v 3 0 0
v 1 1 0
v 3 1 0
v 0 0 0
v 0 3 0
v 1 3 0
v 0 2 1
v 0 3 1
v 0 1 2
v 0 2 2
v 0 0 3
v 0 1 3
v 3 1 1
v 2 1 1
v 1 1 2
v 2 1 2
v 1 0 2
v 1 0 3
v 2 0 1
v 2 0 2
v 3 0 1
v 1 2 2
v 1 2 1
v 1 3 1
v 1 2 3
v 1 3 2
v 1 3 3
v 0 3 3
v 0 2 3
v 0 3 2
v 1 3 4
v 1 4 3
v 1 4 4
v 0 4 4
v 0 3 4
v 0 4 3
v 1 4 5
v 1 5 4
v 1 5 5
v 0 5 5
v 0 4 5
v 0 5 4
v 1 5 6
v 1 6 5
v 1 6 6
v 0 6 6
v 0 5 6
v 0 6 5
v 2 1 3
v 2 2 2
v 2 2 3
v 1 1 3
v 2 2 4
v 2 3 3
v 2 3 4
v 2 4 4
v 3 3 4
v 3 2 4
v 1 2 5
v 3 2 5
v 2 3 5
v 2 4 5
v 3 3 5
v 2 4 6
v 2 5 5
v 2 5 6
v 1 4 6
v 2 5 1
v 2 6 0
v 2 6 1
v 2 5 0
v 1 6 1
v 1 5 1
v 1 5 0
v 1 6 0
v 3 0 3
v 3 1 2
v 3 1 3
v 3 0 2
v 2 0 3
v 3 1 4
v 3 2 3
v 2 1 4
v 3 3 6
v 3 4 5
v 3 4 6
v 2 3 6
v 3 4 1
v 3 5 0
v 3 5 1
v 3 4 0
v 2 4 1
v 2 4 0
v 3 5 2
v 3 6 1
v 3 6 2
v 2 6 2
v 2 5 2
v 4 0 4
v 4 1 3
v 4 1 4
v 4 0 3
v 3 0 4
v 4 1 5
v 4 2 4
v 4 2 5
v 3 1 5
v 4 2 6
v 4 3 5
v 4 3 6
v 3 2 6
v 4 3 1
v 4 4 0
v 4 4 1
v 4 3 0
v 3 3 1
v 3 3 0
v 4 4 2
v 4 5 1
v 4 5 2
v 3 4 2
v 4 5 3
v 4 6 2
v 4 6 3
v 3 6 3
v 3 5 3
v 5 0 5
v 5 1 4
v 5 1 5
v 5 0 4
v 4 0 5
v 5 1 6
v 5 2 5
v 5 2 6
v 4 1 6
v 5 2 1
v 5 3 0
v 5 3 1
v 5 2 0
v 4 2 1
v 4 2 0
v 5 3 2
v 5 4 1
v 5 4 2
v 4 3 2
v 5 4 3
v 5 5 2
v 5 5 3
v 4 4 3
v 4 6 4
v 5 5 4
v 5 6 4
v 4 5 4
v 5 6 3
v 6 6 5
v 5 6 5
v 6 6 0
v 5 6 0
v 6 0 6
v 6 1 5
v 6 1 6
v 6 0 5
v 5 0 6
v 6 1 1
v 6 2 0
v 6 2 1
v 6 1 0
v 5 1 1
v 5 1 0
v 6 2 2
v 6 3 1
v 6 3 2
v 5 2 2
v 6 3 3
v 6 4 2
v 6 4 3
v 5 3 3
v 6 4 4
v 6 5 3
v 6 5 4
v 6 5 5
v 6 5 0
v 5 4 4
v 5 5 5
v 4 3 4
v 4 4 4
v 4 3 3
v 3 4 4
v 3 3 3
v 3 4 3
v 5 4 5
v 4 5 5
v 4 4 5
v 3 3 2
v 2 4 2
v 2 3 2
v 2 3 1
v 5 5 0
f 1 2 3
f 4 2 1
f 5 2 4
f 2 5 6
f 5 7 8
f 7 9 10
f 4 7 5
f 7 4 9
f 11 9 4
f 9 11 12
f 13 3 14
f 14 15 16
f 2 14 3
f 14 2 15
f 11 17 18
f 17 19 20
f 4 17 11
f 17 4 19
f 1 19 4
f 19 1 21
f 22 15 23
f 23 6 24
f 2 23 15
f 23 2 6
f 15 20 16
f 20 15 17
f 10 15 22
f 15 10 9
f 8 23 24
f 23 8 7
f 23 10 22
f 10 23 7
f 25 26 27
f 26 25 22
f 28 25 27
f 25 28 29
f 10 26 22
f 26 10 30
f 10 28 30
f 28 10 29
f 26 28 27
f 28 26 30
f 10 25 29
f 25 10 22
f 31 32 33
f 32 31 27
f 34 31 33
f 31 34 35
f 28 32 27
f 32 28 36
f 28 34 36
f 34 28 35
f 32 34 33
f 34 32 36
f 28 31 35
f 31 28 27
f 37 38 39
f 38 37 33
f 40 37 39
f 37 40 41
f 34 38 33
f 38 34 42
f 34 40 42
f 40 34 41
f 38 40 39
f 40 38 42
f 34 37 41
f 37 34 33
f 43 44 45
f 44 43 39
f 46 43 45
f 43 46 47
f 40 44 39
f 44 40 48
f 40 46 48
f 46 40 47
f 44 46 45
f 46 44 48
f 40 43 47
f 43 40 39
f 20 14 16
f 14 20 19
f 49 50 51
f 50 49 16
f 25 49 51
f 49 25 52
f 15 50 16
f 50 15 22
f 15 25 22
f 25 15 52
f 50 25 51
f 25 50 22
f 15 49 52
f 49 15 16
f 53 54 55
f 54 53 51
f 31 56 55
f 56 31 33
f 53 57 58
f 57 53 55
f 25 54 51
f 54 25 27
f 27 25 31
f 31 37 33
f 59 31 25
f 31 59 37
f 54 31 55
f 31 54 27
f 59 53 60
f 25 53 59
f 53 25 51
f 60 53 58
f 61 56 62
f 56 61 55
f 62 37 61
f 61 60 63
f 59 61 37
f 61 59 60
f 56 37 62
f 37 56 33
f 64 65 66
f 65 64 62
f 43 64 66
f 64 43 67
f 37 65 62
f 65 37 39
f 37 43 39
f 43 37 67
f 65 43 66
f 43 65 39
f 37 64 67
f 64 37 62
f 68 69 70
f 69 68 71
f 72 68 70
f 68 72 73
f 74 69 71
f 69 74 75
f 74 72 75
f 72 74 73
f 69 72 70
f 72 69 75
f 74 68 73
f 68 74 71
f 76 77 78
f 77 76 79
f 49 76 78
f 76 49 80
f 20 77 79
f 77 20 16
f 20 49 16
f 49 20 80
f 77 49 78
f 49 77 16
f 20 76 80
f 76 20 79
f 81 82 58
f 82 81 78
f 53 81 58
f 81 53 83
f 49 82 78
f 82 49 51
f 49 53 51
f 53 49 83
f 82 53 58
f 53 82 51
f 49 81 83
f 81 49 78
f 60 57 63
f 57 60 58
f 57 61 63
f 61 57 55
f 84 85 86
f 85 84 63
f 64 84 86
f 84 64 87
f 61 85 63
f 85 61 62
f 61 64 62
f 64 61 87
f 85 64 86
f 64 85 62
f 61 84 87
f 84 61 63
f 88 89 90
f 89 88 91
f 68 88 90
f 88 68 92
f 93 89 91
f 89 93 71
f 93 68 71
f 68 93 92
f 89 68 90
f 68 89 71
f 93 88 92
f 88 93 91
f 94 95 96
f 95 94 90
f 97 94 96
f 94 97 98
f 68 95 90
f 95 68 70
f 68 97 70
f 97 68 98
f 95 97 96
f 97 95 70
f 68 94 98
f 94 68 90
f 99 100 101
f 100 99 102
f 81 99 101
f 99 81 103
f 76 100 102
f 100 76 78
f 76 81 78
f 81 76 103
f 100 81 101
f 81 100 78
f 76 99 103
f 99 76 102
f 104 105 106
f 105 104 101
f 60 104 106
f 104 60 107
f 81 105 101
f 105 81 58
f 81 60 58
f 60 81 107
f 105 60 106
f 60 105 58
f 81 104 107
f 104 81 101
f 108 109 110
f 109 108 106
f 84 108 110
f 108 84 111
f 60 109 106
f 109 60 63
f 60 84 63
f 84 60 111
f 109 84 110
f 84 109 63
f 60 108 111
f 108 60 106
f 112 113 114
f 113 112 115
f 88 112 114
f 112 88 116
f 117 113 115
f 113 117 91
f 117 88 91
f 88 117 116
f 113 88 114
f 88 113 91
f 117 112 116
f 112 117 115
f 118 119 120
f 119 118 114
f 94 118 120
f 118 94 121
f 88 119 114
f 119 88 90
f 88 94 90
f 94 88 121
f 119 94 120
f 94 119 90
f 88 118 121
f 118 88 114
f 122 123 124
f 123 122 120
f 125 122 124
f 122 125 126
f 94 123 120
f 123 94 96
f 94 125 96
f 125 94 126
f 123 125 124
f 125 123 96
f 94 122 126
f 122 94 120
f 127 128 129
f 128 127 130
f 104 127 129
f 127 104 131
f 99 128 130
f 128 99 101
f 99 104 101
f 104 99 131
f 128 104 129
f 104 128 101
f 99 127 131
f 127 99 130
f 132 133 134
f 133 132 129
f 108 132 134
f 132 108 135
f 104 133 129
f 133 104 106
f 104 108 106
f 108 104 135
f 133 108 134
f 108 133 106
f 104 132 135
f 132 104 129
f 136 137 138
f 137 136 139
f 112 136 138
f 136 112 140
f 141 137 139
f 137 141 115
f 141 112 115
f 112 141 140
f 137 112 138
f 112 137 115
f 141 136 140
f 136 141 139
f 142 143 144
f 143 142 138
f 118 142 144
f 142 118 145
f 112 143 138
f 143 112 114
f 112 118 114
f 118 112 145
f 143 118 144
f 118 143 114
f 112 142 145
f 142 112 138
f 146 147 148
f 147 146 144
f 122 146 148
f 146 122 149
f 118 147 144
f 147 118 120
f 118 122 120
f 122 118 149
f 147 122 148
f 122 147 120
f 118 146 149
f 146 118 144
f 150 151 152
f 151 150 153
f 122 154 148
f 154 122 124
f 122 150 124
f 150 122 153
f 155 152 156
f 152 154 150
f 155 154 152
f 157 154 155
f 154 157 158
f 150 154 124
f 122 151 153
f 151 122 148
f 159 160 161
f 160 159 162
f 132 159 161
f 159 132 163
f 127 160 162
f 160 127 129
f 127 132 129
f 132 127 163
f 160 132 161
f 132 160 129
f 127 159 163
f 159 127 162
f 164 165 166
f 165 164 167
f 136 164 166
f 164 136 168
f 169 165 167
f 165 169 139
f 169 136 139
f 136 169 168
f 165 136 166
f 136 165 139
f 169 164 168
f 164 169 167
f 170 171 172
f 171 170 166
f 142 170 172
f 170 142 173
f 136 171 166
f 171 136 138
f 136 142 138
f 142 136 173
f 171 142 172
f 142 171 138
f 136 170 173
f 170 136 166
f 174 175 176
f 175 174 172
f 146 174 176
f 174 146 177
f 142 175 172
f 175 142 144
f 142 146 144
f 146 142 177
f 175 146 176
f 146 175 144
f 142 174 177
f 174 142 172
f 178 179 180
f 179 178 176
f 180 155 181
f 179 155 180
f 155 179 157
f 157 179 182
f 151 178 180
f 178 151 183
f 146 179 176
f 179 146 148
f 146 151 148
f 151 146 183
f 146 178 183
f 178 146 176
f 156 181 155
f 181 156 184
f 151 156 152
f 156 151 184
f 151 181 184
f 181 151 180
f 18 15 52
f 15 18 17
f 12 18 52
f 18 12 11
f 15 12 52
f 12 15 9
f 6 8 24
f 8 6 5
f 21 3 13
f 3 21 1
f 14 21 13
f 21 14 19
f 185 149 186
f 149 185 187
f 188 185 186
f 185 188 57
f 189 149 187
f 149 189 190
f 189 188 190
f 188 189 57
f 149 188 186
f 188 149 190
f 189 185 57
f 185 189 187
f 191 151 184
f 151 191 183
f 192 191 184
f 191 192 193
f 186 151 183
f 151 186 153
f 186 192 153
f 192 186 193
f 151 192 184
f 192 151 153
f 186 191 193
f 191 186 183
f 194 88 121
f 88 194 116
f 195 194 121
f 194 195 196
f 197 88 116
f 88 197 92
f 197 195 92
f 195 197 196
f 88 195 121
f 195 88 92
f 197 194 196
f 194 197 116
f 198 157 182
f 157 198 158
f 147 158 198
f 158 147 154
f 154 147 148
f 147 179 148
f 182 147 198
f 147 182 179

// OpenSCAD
union() {
    translate([0, 0, 0]) cube([1, 1, 1]);
    translate([0, 1, 1]) cube([1, 1, 1]);
    translate([0, 2, 2]) cube([1, 1, 1]);
    translate([0, 3, 3]) cube([1, 1, 1]);
    translate([0, 4, 4]) cube([1, 1, 1]);
    translate([0, 5, 5]) cube([1, 1, 1]);
    translate([1, 0, 1]) cube([1, 1, 1]);
    translate([1, 1, 2]) cube([1, 1, 1]);
    translate([1, 2, 3]) cube([1, 1, 1]);
    translate([1, 3, 4]) cube([1, 1, 1]);
    translate([1, 4, 5]) cube([1, 1, 1]);
    translate([1, 5, 0]) cube([1, 1, 1]);
    translate([2, 0, 2]) cube([1, 1, 1]);
    translate([2, 1, 3]) cube([1, 1, 1]);
    translate([2, 2, 4]) cube([1, 1, 1]);
    translate([2, 3, 5]) cube([1, 1, 1]);
    translate([2, 4, 0]) cube([1, 1, 1]);
    translate([2, 5, 1]) cube([1, 1, 1]);
    translate([3, 0, 3]) cube([1, 1, 1]);
    translate([3, 1, 4]) cube([1, 1, 1]);
    translate([3, 2, 5]) cube([1, 1, 1]);
    translate([3, 3, 0]) cube([1, 1, 1]);
    translate([3, 4, 1]) cube([1, 1, 1]);
    translate([3, 5, 2]) cube([1, 1, 1]);
    translate([4, 0, 4]) cube([1, 1, 1]);
    translate([4, 1, 5]) cube([1, 1, 1]);
    translate([4, 2, 0]) cube([1, 1, 1]);
    translate([4, 3, 1]) cube([1, 1, 1]);
    translate([4, 4, 2]) cube([1, 1, 1]);
    translate([4, 5, 3]) cube([1, 1, 1]);
    translate([5, 0, 5]) cube([1, 1, 1]);
    translate([5, 1, 0]) cube([1, 1, 1]);
    translate([5, 2, 1]) cube([1, 1, 1]);
    translate([5, 3, 2]) cube([1, 1, 1]);
    translate([5, 4, 3]) cube([1, 1, 1]);
    translate([5, 5, 4]) cube([1, 1, 1]);
    translate([0, 0, 1]) cube([1, 1, 1]);
    translate([0, 0, 2]) cube([1, 1, 1]);
    translate([0, 1, 0]) cube([1, 1, 1]);
    translate([0, 2, 0]) cube([1, 1, 1]);
    translate([1, 0, 0]) cube([1, 1, 1]);
    translate([2, 0, 0]) cube([1, 1, 1]);
    translate([3, 3, 3]) cube([1, 1, 1]);
    translate([4, 4, 4]) cube([1, 1, 1]);
    translate([1, 2, 4]) cube([1, 1, 1]);
    translate([2, 3, 1]) cube([1, 1, 1]);
    translate([5, 5, 0]) cube([1, 1, 1]);
    translate([5, 5, 1]) cube([1, 1, 1]);
    translate([5, 5, 2]) cube([1, 1, 1]);
    translate([5, 5, 3]) cube([1, 1, 1]);
}
